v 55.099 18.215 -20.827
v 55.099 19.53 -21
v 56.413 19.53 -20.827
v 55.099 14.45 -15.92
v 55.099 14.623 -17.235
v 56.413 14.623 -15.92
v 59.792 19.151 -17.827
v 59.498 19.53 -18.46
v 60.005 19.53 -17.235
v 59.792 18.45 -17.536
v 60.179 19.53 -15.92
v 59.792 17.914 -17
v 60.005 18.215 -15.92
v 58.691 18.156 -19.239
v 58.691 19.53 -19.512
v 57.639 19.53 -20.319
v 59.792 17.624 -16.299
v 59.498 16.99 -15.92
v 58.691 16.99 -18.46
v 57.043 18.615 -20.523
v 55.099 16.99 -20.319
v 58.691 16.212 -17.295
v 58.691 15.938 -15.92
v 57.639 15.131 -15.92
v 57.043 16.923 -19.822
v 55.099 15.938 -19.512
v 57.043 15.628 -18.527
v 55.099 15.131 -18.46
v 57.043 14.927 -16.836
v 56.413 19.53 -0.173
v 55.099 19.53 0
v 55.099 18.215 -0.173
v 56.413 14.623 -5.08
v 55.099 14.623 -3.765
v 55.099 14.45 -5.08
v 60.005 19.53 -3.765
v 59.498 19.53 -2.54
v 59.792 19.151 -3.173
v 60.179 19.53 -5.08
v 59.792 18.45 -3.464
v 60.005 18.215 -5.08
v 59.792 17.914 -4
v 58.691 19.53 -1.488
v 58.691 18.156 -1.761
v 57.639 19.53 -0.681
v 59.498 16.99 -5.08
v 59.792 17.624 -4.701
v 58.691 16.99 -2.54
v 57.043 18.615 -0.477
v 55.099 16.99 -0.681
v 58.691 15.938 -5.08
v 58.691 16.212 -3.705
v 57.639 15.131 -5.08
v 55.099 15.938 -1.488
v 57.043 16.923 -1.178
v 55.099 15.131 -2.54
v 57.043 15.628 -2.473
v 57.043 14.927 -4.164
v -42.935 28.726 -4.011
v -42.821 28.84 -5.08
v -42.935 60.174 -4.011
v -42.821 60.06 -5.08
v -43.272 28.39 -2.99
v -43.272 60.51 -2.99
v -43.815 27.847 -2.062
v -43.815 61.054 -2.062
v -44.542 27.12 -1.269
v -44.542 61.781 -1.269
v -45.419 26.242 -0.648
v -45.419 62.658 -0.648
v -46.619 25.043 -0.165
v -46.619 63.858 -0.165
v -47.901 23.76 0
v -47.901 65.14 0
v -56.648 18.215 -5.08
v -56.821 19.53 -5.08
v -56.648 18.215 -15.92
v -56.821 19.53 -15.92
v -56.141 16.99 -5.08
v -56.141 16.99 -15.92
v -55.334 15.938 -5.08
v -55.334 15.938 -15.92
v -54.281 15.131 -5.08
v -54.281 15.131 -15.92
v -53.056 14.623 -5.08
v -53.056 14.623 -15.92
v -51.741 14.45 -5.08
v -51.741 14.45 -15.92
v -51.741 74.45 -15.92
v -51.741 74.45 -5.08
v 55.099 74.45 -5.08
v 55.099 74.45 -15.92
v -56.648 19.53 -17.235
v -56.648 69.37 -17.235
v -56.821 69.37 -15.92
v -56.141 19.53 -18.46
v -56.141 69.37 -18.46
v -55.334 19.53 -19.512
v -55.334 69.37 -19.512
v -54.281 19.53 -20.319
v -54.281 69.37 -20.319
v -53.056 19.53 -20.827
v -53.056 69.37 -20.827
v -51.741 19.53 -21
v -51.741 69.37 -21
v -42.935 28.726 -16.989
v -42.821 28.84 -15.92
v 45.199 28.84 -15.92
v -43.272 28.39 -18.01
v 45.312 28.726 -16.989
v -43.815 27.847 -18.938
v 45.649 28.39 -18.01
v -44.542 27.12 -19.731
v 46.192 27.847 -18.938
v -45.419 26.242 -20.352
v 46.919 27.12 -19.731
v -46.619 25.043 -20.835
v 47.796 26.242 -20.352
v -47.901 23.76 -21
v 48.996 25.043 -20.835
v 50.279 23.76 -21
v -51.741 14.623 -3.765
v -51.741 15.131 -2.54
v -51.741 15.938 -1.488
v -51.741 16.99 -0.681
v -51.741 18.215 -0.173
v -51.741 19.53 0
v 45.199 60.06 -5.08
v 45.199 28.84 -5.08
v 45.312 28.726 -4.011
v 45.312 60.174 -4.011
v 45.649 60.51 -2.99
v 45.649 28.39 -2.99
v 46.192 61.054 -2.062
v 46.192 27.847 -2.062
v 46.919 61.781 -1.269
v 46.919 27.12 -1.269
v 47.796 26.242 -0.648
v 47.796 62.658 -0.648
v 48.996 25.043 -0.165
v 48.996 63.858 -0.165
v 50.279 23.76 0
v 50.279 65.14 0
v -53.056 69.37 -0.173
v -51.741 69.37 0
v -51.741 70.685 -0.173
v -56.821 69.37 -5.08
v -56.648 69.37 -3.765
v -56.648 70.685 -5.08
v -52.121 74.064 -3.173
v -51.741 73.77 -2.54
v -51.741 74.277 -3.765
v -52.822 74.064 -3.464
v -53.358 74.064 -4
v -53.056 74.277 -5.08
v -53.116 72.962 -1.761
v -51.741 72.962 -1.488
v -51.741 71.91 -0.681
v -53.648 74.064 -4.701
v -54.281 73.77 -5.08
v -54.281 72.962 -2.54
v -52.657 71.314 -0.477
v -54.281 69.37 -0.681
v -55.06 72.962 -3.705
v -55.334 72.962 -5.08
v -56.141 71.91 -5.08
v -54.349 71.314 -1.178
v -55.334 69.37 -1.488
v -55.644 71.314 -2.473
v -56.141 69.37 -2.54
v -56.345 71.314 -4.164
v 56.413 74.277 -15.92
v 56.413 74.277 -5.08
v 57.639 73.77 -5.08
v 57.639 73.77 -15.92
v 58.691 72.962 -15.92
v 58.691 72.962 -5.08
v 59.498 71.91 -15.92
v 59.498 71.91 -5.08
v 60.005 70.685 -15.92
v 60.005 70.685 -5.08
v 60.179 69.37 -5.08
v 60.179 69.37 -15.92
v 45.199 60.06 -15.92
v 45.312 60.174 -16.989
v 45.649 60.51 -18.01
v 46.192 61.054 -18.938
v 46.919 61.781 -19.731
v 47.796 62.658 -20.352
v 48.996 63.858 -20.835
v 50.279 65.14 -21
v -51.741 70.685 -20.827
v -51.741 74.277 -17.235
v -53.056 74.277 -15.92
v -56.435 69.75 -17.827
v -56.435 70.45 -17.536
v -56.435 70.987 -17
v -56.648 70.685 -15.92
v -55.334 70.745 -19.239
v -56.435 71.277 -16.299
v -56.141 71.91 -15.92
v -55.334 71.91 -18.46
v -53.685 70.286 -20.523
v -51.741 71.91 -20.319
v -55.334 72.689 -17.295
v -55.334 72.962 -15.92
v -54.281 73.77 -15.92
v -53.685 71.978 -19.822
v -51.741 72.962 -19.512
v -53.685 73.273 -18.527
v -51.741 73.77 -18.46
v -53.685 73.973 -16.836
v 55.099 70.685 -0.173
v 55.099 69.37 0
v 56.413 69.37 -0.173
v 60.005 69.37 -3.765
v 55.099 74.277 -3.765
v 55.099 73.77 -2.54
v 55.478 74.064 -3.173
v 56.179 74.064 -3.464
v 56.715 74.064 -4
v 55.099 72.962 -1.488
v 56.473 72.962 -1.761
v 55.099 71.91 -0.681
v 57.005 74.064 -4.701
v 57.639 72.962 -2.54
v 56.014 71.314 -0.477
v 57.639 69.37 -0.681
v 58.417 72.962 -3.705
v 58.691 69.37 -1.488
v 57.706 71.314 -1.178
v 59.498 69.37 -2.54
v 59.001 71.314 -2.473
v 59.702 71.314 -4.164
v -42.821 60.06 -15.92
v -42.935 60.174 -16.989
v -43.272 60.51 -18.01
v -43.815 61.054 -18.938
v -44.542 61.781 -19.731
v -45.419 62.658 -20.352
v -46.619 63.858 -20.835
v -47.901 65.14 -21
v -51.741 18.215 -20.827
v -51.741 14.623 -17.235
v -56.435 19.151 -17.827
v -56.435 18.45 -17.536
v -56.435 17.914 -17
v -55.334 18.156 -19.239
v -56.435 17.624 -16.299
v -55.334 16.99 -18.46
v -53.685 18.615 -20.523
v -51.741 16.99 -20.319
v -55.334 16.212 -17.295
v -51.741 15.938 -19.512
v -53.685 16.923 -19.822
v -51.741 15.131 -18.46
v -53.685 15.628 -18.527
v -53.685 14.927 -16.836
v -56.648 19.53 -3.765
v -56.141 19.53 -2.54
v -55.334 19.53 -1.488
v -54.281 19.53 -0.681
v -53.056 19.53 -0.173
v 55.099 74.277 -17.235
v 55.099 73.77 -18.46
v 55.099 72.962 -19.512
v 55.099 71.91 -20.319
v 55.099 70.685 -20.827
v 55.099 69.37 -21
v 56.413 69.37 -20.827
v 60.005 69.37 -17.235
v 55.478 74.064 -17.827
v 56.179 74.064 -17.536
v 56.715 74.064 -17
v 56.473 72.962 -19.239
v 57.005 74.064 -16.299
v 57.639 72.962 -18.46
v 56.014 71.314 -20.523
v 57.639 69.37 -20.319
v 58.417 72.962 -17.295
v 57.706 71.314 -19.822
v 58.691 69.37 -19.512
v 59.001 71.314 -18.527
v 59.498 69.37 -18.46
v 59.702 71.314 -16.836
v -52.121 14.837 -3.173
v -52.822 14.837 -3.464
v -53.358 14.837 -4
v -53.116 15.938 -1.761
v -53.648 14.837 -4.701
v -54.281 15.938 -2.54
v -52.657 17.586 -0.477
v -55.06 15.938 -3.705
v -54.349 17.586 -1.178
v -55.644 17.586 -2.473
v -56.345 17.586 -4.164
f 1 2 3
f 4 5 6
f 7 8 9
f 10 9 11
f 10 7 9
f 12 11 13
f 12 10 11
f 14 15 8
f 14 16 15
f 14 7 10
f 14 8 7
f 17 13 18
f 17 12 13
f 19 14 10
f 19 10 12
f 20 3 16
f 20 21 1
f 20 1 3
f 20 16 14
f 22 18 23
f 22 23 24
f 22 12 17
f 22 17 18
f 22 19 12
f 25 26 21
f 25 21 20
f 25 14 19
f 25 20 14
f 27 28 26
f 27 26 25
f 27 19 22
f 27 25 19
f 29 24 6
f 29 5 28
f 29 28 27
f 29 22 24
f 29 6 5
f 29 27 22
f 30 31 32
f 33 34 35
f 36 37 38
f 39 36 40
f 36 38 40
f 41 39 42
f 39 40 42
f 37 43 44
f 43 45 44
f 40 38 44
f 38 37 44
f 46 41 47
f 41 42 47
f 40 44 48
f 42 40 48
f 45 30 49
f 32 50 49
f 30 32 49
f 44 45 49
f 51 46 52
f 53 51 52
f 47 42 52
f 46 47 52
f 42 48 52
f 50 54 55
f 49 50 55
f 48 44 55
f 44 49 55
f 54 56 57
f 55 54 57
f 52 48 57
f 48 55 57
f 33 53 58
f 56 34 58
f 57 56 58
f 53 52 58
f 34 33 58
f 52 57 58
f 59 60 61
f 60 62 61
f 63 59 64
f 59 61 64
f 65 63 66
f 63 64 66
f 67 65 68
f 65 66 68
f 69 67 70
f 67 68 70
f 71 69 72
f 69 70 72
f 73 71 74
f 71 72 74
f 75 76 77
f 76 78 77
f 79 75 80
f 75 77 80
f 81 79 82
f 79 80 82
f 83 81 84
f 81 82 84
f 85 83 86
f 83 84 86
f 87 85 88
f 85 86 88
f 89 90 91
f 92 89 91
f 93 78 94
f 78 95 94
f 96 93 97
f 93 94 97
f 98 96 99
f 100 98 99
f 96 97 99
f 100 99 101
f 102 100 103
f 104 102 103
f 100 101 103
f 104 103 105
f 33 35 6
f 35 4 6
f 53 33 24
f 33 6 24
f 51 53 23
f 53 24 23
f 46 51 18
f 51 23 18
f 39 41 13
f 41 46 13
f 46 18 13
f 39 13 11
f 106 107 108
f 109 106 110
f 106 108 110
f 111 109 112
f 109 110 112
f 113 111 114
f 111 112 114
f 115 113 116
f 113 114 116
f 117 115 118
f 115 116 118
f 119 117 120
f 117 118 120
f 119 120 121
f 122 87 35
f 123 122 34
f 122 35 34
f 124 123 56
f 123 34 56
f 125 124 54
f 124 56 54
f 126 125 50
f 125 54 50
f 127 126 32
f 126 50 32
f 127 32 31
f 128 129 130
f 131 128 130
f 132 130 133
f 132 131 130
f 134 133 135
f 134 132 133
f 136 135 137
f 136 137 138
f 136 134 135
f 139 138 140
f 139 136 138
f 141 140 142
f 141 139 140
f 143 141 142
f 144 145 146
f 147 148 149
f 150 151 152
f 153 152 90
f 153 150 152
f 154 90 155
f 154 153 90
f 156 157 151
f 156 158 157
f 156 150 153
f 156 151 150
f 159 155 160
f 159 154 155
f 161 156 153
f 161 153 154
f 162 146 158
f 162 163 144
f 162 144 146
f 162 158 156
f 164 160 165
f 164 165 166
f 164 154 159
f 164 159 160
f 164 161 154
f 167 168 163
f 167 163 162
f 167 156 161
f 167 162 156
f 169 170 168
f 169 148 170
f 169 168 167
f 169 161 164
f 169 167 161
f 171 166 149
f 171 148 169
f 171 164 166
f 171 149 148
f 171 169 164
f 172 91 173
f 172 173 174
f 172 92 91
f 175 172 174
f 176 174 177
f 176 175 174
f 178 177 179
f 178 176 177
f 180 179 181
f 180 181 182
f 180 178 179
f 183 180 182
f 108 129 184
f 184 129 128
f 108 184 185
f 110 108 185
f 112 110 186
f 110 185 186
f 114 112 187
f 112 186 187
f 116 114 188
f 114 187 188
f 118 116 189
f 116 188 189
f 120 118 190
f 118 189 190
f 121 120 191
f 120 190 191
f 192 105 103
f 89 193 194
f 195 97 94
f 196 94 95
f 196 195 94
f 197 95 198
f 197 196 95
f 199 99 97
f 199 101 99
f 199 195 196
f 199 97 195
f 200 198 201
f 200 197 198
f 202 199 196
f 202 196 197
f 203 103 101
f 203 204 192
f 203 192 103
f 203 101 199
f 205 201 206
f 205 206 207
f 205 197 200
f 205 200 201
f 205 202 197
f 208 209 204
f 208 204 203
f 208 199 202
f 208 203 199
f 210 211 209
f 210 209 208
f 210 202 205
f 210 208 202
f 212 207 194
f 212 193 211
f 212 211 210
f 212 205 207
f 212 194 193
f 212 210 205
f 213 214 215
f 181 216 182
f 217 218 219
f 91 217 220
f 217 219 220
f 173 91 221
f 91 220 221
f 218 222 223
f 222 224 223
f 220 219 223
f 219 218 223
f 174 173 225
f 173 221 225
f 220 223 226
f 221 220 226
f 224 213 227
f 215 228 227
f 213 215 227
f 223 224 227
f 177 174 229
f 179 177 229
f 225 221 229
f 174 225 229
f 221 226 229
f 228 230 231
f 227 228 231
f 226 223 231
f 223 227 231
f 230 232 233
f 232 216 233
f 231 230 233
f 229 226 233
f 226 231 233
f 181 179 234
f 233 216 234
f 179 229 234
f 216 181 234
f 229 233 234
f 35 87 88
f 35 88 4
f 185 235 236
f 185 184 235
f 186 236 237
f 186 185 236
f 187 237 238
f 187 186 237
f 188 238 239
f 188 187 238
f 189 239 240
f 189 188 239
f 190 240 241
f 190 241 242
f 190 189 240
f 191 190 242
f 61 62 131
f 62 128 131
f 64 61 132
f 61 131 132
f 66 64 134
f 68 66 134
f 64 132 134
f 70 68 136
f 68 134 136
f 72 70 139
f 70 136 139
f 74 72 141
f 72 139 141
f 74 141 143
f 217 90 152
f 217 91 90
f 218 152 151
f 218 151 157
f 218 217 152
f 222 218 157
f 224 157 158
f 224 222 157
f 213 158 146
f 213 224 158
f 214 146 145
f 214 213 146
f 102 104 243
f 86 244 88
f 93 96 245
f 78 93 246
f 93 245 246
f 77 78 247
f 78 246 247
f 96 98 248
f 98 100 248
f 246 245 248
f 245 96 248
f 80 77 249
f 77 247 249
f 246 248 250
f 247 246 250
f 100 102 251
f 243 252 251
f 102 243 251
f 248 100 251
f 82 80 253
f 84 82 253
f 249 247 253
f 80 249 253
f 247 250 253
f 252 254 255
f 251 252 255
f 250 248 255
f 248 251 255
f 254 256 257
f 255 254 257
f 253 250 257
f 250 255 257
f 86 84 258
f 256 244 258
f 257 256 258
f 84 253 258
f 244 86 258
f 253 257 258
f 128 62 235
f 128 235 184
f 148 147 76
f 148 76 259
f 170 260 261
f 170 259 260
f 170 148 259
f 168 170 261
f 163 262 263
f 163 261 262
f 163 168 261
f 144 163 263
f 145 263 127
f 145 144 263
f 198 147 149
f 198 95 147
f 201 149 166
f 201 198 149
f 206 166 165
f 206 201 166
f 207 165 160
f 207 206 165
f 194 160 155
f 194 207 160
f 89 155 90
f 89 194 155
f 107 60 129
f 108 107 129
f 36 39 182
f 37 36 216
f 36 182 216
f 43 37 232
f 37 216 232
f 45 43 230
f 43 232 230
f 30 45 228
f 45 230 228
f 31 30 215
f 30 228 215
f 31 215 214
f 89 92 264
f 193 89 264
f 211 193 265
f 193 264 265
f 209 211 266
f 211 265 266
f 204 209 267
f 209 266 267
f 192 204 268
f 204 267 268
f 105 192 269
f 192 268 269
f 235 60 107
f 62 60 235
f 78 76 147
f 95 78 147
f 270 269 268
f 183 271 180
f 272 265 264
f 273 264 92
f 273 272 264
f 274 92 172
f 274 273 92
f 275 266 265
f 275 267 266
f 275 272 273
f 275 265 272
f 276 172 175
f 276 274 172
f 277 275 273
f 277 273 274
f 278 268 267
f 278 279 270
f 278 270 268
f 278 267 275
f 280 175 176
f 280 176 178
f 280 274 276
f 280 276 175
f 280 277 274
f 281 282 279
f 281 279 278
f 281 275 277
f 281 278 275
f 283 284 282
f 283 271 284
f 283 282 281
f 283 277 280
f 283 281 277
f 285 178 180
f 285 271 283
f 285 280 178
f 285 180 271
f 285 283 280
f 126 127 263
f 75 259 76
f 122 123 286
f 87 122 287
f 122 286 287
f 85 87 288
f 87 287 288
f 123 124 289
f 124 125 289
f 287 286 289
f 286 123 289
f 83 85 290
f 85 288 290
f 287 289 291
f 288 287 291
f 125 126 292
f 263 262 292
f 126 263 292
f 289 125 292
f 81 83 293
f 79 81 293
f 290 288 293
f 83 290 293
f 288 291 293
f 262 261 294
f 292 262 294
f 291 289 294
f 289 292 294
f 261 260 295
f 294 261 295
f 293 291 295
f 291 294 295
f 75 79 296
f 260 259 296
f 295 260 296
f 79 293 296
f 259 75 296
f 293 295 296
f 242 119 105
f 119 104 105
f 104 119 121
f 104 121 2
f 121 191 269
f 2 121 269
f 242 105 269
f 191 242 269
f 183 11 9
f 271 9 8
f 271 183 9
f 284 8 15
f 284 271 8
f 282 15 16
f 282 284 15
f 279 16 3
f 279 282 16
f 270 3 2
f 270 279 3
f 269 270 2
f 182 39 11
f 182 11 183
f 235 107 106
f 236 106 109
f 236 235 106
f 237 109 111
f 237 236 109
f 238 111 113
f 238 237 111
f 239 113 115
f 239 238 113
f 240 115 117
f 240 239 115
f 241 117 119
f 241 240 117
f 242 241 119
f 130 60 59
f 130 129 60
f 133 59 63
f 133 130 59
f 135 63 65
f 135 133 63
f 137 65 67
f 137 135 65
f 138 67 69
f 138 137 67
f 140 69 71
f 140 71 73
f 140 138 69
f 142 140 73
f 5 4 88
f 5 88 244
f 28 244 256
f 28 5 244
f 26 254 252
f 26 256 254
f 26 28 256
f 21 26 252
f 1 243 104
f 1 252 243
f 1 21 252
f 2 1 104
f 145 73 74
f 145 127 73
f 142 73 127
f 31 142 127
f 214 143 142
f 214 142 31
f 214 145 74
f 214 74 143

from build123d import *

# Parameters (mm, degrees)
F0_W     = 117
F0_H     = 60
F0_W_2   = 88.02
F0_H_2   = 31.22
F1_DEPTH = 21
F2_R     = 5.08


with BuildPart() as f1:
    # F0 (on Top) → F1 (new body)
    with BuildSketch(Plane.XY):
        with Locations((1.678534, 44.450285)):
            Rectangle(F0_W, F0_H)
        with Locations((1.188534, 44.450285)):
            Rectangle(F0_W_2, F0_H_2, mode=Mode.SUBTRACT)
    extrude(amount=-F1_DEPTH)

    # F2
    f2_edges = [f1.edges().sort_by_distance(p)[0] for p in [
        (-56.821466, 44.450285, 0),
        (1.678534, 14.450285, 0),
        (60.178534, 44.450285, 0),
        (1.678534, 74.450285, 0),
        (1.678534, 14.450285, -21),
        (60.178534, 44.450285, -21),
        (1.678534, 74.450285, -21),
        (-56.821466, 44.450285, -21),
        (-56.821466, 14.450285, -10.5),
        (-56.821466, 74.450285, -10.5),
        (60.178534, 14.450285, -10.5),
        (60.178534, 74.450285, -10.5),
        (45.198534, 44.450285, -21),
        (1.188534, 60.060285, -21),
        (-42.821466, 44.450285, -21),
        (1.188534, 28.840285, -21),
        (1.188534, 28.840285, 0),
        (-42.821466, 44.450285, 0),
        (45.198534, 44.450285, 0),
        (1.188534, 60.060285, 0),
    ]]
    fillet(f2_edges, radius=F2_R)


solid = f1.part
